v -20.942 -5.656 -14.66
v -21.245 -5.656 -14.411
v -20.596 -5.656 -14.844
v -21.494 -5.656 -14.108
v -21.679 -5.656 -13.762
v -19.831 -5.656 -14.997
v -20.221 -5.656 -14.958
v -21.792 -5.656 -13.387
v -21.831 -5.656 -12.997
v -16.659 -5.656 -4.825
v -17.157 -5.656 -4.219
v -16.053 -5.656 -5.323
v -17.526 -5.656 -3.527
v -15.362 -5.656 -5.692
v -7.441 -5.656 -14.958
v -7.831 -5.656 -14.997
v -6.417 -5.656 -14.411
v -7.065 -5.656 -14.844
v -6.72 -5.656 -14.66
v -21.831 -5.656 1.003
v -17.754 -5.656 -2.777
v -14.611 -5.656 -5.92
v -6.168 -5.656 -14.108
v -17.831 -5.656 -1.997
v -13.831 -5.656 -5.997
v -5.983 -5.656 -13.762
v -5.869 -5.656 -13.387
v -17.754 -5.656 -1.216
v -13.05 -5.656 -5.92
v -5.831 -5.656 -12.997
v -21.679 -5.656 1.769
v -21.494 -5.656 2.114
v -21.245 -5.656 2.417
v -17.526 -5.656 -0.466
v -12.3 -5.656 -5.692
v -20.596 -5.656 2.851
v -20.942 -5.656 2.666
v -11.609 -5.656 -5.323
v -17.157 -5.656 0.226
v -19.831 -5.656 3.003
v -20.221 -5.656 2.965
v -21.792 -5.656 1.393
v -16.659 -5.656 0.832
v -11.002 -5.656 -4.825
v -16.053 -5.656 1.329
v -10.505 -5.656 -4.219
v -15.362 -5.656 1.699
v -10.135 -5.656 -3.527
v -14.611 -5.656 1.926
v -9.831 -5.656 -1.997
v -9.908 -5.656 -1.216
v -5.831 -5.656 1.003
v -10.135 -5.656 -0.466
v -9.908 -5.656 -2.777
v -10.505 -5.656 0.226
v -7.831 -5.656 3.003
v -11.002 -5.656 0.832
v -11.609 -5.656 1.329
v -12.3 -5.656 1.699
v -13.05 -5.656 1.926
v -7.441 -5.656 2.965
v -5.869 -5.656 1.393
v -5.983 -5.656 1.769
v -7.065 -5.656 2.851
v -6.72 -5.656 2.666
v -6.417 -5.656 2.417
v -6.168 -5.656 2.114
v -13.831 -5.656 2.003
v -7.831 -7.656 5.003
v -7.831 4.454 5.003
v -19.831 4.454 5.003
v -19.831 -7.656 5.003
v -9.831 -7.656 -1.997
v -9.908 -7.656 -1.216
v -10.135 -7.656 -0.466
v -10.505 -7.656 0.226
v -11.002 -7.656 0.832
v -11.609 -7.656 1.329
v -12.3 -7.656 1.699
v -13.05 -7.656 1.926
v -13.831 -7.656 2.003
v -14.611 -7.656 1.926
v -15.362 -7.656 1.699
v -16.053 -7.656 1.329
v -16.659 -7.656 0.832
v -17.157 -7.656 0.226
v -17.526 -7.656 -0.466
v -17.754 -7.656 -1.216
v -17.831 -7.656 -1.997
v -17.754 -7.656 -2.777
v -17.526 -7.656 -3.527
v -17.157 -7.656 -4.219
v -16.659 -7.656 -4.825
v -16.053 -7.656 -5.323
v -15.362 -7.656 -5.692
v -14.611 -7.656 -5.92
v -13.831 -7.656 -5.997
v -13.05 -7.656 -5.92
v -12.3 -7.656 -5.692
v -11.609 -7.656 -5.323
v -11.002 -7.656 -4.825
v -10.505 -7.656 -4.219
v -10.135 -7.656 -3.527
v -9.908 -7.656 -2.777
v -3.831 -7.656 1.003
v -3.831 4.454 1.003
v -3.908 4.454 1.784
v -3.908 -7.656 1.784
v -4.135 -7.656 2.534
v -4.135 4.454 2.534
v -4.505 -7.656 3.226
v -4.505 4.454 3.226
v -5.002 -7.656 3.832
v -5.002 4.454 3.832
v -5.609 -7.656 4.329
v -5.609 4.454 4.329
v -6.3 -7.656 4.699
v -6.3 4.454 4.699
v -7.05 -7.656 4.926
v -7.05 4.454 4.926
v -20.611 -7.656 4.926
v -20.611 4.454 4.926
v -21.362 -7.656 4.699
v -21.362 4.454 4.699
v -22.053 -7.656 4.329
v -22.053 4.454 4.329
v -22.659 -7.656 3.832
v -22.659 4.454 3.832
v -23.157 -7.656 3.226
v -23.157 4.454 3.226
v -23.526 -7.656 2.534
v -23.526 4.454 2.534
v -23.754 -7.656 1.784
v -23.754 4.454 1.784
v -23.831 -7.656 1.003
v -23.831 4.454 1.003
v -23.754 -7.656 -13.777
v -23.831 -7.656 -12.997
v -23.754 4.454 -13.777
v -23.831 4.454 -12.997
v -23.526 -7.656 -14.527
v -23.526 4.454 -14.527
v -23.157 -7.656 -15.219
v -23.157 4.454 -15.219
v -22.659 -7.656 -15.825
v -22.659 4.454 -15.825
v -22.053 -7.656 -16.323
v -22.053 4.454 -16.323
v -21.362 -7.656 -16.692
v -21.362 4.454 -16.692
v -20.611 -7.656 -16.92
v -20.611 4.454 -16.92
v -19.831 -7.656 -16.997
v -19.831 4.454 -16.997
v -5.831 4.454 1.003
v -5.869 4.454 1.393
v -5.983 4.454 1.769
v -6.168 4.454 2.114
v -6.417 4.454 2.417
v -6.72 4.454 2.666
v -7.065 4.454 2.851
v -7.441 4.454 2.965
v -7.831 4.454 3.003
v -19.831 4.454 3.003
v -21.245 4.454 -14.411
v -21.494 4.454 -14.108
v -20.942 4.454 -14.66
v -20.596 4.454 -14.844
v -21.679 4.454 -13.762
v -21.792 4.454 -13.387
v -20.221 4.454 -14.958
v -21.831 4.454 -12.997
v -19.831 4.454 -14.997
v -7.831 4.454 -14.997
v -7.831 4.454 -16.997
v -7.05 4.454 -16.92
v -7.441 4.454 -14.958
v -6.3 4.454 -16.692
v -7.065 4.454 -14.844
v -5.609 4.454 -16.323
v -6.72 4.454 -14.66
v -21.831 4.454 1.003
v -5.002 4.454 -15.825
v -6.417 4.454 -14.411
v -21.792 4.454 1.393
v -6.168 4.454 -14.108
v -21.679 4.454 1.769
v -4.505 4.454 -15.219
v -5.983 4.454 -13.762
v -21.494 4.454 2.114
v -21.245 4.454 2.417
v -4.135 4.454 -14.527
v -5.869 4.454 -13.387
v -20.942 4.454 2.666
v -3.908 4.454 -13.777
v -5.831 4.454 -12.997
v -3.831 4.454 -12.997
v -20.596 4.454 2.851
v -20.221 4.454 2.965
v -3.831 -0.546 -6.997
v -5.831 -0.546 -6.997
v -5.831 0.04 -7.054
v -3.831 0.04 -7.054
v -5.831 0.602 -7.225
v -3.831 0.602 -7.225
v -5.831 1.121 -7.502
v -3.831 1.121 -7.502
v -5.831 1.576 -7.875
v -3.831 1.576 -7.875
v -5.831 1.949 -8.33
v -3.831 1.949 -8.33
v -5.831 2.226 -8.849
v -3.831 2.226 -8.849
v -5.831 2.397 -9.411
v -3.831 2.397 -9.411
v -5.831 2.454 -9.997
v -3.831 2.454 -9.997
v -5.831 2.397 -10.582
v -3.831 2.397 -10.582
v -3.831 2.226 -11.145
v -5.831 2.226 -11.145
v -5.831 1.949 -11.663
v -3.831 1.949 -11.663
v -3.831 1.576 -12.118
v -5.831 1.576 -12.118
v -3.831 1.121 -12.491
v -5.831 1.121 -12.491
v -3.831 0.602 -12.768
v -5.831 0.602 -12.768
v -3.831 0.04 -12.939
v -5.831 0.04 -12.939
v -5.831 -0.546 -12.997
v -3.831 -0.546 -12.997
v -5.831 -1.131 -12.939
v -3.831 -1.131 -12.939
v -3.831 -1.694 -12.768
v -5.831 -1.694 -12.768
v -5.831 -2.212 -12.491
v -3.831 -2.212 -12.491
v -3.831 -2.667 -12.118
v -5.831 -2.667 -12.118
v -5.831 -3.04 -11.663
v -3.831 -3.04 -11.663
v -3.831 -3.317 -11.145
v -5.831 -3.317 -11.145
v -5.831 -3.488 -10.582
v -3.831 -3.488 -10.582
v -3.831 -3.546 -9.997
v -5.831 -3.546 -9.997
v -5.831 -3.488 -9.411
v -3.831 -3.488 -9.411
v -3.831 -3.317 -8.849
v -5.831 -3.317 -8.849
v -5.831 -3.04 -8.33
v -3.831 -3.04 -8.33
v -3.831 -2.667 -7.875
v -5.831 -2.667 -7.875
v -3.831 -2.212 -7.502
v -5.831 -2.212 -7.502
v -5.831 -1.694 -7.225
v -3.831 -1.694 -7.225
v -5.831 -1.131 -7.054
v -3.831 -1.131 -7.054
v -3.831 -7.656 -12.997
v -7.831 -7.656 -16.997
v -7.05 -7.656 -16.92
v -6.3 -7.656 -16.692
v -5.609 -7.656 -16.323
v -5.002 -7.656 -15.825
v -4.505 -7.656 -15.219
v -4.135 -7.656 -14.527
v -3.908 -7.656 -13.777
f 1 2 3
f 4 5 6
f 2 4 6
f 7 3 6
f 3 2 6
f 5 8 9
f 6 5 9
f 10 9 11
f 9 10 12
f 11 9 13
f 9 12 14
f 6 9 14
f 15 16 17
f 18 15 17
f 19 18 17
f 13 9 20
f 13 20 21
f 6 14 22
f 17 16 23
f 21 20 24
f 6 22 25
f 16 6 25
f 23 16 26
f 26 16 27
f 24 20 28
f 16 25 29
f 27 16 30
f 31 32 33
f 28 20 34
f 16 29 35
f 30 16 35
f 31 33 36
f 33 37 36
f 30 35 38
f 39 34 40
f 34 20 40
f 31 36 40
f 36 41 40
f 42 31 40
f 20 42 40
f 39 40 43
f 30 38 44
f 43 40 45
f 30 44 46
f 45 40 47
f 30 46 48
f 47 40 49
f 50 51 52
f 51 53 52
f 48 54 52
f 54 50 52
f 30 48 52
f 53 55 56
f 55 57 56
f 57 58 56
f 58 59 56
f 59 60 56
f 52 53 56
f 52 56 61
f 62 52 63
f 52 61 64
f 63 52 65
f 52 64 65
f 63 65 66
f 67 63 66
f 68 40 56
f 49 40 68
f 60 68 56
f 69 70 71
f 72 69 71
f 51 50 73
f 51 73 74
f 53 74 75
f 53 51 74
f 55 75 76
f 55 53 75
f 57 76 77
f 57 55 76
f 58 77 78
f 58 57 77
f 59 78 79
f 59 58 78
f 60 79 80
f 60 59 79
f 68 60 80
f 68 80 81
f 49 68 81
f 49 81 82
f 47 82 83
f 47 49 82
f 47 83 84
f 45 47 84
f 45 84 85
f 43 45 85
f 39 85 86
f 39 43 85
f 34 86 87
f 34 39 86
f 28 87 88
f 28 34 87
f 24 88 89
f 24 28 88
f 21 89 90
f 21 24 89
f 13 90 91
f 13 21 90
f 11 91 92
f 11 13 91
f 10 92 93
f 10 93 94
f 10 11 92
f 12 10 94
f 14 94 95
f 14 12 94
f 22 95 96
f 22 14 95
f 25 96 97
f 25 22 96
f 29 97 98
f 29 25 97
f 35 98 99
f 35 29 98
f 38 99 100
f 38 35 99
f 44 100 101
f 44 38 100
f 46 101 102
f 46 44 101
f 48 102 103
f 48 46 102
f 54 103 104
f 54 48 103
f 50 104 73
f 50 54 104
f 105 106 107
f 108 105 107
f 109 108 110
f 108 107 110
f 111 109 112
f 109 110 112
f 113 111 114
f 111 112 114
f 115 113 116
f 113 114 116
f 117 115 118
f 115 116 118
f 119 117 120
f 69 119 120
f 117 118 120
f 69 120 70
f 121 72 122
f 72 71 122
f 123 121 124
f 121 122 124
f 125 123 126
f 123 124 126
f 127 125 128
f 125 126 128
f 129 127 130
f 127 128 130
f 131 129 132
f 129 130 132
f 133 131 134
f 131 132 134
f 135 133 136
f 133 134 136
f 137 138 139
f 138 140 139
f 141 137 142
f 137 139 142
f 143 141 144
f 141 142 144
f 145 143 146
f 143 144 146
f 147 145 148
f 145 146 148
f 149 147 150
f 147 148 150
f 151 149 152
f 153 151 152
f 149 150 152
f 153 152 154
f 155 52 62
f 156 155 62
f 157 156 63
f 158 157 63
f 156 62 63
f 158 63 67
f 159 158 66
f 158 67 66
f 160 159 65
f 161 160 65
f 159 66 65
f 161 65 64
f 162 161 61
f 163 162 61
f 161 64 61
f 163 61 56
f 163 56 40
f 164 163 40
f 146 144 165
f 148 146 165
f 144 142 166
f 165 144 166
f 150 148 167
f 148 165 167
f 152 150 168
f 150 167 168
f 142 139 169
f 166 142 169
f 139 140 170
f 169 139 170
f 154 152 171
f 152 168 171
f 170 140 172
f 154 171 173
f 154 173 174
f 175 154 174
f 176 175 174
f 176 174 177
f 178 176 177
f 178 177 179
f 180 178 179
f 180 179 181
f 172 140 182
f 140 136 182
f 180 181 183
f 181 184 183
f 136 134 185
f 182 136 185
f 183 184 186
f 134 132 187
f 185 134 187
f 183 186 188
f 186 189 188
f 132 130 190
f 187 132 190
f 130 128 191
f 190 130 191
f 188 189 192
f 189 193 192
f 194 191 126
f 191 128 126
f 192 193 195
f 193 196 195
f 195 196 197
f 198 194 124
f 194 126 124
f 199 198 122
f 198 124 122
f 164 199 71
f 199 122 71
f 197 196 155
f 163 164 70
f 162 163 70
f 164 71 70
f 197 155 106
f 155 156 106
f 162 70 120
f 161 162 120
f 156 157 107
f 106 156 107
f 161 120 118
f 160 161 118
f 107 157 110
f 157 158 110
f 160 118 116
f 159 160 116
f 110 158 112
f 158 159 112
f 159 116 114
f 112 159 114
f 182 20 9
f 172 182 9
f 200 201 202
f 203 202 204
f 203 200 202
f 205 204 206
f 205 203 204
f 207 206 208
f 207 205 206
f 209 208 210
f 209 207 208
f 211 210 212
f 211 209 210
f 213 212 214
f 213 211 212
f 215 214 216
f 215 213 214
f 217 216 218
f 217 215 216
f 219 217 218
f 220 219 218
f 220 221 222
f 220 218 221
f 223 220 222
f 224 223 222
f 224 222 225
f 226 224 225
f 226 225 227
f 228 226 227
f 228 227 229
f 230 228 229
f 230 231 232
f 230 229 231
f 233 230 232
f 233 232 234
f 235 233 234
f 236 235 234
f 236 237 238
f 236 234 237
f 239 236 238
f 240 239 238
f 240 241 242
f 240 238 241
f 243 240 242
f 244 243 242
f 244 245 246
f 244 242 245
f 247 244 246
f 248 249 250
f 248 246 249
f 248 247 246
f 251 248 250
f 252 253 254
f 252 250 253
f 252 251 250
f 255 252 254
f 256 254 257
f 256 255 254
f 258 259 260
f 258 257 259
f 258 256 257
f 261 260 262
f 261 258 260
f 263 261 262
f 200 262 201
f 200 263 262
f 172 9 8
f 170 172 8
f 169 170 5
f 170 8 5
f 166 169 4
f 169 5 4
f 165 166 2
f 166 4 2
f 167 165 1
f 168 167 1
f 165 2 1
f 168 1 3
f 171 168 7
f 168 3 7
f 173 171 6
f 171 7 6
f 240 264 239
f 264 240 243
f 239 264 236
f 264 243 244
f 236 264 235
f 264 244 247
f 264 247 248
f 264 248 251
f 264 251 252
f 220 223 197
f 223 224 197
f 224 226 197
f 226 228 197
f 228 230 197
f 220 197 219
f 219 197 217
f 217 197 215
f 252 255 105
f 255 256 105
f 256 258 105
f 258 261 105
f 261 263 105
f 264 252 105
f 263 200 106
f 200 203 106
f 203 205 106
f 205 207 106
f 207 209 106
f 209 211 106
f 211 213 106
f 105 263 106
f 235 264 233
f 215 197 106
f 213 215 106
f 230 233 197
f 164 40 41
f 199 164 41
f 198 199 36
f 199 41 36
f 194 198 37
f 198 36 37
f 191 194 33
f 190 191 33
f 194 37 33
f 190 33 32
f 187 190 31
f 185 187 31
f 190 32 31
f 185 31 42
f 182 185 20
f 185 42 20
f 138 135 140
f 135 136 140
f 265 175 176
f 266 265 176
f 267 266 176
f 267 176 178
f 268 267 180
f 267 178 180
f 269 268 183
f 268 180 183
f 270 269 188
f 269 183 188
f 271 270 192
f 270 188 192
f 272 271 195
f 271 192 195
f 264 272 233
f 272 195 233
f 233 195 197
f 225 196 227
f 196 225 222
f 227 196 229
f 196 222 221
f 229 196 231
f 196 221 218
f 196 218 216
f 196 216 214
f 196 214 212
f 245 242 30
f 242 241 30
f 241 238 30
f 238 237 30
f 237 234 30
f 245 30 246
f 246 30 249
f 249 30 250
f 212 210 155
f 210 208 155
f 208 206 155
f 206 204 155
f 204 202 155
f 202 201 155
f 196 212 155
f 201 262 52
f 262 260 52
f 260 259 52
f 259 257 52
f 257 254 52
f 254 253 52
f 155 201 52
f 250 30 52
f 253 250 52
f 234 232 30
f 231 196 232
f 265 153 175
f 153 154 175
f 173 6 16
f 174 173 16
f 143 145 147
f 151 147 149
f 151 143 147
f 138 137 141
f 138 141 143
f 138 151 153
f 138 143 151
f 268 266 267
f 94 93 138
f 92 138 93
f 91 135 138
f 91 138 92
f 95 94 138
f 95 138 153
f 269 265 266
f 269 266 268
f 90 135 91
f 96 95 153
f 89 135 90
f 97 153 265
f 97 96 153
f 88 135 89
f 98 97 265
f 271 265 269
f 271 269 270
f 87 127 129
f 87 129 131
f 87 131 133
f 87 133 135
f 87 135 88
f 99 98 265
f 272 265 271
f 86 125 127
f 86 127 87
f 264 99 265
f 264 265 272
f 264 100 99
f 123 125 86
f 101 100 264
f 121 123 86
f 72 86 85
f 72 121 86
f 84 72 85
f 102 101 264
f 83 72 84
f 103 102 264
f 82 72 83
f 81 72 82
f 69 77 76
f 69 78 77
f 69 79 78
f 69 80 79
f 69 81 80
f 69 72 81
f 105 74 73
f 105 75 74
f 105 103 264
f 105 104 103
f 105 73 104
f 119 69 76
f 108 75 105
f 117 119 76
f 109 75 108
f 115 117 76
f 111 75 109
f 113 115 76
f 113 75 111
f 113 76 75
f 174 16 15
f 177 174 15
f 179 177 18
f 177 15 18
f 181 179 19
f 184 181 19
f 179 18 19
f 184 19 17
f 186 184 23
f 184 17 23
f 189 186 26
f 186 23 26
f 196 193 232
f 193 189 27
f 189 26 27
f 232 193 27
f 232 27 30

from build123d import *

# Parameters (mm, degrees)
BOSS_EXTRUDE1_DEPTH = 10.11
SKETCH1_3_R         = 4
BOSS_EXTRUDE2_DEPTH = 2
CUT_EXTRUDE1_REACH  = 22
SKETCH3_R           = 3


with BuildPart() as part:
    # Sketch1 → Boss-Extrude1 (new body)
    with BuildSketch(Plane.XZ.offset(5.655564884)):
        with BuildLine():
            Line((-3.830791813, -12.996740626), (-3.830791813, 1.003259374))
            ThreePointArc((-3.830791813, 1.003259374), (-5.002364688, 3.831686499), (-7.830791813, 5.003259374))
            Line((-7.830791813, 5.003259374), (-19.830791813, 5.003259374))
            ThreePointArc((-19.830791813, 5.003259374), (-22.659218938, 3.831686499), (-23.830791813, 1.003259374))
            Line((-23.830791813, 1.003259374), (-23.830791813, -12.996740626))
            ThreePointArc((-23.830791813, -12.996740626), (-22.659218938, -15.825167751), (-19.830791813, -16.996740626))
            Line((-19.830791813, -16.996740626), (-7.830791813, -16.996740626))
            ThreePointArc((-7.830791813, -16.996740626), (-5.002364688, -15.825167751), (-3.830791813, -12.996740626))
        make_face()
        with BuildLine():
            ThreePointArc((-21.830791813, -12.996740626), (-21.245005376, -14.410954188), (-19.830791813, -14.996740626))
            Line((-19.830791813, -14.996740626), (-7.830791813, -14.996740626))
            ThreePointArc((-7.830791813, -14.996740626), (-6.416578251, -14.410954188), (-5.830791813, -12.996740626))
            Line((-5.830791813, -12.996740626), (-5.830791813, 1.003259374))
            ThreePointArc((-5.830791813, 1.003259374), (-6.416578251, 2.417472937), (-7.830791813, 3.003259374))
            Line((-7.830791813, 3.003259374), (-19.830791813, 3.003259374))
            ThreePointArc((-19.830791813, 3.003259374), (-21.245005376, 2.417472937), (-21.830791813, 1.003259374))
            Line((-21.830791813, 1.003259374), (-21.830791813, -12.996740626))
        make_face(mode=Mode.SUBTRACT)
    extrude(amount=-BOSS_EXTRUDE1_DEPTH)

    # Sketch1_3 → Boss-Extrude2 (add)
    with BuildSketch(Plane.XZ.offset(5.655564884)):
        with BuildLine():
            Line((-7.830791813, 5.003259374), (-19.830791813, 5.003259374))
            ThreePointArc((-19.830791813, 5.003259374), (-22.659218938, 3.831686499), (-23.830791813, 1.003259374))
            Line((-23.830791813, 1.003259374), (-23.830791813, -12.996740626))
            ThreePointArc((-23.830791813, -12.996740626), (-22.659218938, -15.825167751), (-19.830791813, -16.996740626))
            Line((-19.830791813, -16.996740626), (-7.830791813, -16.996740626))
            ThreePointArc((-7.830791813, -16.996740626), (-5.002364688, -15.825167751), (-3.830791813, -12.996740626))
            Line((-3.830791813, -12.996740626), (-3.830791813, 1.003259374))
            ThreePointArc((-3.830791813, 1.003259374), (-5.002364688, 3.831686499), (-7.830791813, 5.003259374))
        make_face()
        with Locations((-13.830791813, -1.996740626)):
            Circle(SKETCH1_3_R, mode=Mode.SUBTRACT)
    extrude(amount=BOSS_EXTRUDE2_DEPTH)

    # Sketch3 → Cut-Extrude1 (cut, up to next)
    with BuildSketch(Plane.ZY.offset(3.830791813), mode=Mode.PRIVATE) as cut_extrude1_sk1:
        with Locations((-9.996740626, -0.545564884)):
            Circle(SKETCH3_R)
    cut_extrude1_tool1 = extrude(cut_extrude1_sk1.sketch, amount=CUT_EXTRUDE1_REACH, mode=Mode.PRIVATE) & part.part
    add(cut_extrude1_tool1.solids().sort_by_distance((-3.830792, -0.545565, -9.996741))[0], mode=Mode.SUBTRACT)


solid = part.part
